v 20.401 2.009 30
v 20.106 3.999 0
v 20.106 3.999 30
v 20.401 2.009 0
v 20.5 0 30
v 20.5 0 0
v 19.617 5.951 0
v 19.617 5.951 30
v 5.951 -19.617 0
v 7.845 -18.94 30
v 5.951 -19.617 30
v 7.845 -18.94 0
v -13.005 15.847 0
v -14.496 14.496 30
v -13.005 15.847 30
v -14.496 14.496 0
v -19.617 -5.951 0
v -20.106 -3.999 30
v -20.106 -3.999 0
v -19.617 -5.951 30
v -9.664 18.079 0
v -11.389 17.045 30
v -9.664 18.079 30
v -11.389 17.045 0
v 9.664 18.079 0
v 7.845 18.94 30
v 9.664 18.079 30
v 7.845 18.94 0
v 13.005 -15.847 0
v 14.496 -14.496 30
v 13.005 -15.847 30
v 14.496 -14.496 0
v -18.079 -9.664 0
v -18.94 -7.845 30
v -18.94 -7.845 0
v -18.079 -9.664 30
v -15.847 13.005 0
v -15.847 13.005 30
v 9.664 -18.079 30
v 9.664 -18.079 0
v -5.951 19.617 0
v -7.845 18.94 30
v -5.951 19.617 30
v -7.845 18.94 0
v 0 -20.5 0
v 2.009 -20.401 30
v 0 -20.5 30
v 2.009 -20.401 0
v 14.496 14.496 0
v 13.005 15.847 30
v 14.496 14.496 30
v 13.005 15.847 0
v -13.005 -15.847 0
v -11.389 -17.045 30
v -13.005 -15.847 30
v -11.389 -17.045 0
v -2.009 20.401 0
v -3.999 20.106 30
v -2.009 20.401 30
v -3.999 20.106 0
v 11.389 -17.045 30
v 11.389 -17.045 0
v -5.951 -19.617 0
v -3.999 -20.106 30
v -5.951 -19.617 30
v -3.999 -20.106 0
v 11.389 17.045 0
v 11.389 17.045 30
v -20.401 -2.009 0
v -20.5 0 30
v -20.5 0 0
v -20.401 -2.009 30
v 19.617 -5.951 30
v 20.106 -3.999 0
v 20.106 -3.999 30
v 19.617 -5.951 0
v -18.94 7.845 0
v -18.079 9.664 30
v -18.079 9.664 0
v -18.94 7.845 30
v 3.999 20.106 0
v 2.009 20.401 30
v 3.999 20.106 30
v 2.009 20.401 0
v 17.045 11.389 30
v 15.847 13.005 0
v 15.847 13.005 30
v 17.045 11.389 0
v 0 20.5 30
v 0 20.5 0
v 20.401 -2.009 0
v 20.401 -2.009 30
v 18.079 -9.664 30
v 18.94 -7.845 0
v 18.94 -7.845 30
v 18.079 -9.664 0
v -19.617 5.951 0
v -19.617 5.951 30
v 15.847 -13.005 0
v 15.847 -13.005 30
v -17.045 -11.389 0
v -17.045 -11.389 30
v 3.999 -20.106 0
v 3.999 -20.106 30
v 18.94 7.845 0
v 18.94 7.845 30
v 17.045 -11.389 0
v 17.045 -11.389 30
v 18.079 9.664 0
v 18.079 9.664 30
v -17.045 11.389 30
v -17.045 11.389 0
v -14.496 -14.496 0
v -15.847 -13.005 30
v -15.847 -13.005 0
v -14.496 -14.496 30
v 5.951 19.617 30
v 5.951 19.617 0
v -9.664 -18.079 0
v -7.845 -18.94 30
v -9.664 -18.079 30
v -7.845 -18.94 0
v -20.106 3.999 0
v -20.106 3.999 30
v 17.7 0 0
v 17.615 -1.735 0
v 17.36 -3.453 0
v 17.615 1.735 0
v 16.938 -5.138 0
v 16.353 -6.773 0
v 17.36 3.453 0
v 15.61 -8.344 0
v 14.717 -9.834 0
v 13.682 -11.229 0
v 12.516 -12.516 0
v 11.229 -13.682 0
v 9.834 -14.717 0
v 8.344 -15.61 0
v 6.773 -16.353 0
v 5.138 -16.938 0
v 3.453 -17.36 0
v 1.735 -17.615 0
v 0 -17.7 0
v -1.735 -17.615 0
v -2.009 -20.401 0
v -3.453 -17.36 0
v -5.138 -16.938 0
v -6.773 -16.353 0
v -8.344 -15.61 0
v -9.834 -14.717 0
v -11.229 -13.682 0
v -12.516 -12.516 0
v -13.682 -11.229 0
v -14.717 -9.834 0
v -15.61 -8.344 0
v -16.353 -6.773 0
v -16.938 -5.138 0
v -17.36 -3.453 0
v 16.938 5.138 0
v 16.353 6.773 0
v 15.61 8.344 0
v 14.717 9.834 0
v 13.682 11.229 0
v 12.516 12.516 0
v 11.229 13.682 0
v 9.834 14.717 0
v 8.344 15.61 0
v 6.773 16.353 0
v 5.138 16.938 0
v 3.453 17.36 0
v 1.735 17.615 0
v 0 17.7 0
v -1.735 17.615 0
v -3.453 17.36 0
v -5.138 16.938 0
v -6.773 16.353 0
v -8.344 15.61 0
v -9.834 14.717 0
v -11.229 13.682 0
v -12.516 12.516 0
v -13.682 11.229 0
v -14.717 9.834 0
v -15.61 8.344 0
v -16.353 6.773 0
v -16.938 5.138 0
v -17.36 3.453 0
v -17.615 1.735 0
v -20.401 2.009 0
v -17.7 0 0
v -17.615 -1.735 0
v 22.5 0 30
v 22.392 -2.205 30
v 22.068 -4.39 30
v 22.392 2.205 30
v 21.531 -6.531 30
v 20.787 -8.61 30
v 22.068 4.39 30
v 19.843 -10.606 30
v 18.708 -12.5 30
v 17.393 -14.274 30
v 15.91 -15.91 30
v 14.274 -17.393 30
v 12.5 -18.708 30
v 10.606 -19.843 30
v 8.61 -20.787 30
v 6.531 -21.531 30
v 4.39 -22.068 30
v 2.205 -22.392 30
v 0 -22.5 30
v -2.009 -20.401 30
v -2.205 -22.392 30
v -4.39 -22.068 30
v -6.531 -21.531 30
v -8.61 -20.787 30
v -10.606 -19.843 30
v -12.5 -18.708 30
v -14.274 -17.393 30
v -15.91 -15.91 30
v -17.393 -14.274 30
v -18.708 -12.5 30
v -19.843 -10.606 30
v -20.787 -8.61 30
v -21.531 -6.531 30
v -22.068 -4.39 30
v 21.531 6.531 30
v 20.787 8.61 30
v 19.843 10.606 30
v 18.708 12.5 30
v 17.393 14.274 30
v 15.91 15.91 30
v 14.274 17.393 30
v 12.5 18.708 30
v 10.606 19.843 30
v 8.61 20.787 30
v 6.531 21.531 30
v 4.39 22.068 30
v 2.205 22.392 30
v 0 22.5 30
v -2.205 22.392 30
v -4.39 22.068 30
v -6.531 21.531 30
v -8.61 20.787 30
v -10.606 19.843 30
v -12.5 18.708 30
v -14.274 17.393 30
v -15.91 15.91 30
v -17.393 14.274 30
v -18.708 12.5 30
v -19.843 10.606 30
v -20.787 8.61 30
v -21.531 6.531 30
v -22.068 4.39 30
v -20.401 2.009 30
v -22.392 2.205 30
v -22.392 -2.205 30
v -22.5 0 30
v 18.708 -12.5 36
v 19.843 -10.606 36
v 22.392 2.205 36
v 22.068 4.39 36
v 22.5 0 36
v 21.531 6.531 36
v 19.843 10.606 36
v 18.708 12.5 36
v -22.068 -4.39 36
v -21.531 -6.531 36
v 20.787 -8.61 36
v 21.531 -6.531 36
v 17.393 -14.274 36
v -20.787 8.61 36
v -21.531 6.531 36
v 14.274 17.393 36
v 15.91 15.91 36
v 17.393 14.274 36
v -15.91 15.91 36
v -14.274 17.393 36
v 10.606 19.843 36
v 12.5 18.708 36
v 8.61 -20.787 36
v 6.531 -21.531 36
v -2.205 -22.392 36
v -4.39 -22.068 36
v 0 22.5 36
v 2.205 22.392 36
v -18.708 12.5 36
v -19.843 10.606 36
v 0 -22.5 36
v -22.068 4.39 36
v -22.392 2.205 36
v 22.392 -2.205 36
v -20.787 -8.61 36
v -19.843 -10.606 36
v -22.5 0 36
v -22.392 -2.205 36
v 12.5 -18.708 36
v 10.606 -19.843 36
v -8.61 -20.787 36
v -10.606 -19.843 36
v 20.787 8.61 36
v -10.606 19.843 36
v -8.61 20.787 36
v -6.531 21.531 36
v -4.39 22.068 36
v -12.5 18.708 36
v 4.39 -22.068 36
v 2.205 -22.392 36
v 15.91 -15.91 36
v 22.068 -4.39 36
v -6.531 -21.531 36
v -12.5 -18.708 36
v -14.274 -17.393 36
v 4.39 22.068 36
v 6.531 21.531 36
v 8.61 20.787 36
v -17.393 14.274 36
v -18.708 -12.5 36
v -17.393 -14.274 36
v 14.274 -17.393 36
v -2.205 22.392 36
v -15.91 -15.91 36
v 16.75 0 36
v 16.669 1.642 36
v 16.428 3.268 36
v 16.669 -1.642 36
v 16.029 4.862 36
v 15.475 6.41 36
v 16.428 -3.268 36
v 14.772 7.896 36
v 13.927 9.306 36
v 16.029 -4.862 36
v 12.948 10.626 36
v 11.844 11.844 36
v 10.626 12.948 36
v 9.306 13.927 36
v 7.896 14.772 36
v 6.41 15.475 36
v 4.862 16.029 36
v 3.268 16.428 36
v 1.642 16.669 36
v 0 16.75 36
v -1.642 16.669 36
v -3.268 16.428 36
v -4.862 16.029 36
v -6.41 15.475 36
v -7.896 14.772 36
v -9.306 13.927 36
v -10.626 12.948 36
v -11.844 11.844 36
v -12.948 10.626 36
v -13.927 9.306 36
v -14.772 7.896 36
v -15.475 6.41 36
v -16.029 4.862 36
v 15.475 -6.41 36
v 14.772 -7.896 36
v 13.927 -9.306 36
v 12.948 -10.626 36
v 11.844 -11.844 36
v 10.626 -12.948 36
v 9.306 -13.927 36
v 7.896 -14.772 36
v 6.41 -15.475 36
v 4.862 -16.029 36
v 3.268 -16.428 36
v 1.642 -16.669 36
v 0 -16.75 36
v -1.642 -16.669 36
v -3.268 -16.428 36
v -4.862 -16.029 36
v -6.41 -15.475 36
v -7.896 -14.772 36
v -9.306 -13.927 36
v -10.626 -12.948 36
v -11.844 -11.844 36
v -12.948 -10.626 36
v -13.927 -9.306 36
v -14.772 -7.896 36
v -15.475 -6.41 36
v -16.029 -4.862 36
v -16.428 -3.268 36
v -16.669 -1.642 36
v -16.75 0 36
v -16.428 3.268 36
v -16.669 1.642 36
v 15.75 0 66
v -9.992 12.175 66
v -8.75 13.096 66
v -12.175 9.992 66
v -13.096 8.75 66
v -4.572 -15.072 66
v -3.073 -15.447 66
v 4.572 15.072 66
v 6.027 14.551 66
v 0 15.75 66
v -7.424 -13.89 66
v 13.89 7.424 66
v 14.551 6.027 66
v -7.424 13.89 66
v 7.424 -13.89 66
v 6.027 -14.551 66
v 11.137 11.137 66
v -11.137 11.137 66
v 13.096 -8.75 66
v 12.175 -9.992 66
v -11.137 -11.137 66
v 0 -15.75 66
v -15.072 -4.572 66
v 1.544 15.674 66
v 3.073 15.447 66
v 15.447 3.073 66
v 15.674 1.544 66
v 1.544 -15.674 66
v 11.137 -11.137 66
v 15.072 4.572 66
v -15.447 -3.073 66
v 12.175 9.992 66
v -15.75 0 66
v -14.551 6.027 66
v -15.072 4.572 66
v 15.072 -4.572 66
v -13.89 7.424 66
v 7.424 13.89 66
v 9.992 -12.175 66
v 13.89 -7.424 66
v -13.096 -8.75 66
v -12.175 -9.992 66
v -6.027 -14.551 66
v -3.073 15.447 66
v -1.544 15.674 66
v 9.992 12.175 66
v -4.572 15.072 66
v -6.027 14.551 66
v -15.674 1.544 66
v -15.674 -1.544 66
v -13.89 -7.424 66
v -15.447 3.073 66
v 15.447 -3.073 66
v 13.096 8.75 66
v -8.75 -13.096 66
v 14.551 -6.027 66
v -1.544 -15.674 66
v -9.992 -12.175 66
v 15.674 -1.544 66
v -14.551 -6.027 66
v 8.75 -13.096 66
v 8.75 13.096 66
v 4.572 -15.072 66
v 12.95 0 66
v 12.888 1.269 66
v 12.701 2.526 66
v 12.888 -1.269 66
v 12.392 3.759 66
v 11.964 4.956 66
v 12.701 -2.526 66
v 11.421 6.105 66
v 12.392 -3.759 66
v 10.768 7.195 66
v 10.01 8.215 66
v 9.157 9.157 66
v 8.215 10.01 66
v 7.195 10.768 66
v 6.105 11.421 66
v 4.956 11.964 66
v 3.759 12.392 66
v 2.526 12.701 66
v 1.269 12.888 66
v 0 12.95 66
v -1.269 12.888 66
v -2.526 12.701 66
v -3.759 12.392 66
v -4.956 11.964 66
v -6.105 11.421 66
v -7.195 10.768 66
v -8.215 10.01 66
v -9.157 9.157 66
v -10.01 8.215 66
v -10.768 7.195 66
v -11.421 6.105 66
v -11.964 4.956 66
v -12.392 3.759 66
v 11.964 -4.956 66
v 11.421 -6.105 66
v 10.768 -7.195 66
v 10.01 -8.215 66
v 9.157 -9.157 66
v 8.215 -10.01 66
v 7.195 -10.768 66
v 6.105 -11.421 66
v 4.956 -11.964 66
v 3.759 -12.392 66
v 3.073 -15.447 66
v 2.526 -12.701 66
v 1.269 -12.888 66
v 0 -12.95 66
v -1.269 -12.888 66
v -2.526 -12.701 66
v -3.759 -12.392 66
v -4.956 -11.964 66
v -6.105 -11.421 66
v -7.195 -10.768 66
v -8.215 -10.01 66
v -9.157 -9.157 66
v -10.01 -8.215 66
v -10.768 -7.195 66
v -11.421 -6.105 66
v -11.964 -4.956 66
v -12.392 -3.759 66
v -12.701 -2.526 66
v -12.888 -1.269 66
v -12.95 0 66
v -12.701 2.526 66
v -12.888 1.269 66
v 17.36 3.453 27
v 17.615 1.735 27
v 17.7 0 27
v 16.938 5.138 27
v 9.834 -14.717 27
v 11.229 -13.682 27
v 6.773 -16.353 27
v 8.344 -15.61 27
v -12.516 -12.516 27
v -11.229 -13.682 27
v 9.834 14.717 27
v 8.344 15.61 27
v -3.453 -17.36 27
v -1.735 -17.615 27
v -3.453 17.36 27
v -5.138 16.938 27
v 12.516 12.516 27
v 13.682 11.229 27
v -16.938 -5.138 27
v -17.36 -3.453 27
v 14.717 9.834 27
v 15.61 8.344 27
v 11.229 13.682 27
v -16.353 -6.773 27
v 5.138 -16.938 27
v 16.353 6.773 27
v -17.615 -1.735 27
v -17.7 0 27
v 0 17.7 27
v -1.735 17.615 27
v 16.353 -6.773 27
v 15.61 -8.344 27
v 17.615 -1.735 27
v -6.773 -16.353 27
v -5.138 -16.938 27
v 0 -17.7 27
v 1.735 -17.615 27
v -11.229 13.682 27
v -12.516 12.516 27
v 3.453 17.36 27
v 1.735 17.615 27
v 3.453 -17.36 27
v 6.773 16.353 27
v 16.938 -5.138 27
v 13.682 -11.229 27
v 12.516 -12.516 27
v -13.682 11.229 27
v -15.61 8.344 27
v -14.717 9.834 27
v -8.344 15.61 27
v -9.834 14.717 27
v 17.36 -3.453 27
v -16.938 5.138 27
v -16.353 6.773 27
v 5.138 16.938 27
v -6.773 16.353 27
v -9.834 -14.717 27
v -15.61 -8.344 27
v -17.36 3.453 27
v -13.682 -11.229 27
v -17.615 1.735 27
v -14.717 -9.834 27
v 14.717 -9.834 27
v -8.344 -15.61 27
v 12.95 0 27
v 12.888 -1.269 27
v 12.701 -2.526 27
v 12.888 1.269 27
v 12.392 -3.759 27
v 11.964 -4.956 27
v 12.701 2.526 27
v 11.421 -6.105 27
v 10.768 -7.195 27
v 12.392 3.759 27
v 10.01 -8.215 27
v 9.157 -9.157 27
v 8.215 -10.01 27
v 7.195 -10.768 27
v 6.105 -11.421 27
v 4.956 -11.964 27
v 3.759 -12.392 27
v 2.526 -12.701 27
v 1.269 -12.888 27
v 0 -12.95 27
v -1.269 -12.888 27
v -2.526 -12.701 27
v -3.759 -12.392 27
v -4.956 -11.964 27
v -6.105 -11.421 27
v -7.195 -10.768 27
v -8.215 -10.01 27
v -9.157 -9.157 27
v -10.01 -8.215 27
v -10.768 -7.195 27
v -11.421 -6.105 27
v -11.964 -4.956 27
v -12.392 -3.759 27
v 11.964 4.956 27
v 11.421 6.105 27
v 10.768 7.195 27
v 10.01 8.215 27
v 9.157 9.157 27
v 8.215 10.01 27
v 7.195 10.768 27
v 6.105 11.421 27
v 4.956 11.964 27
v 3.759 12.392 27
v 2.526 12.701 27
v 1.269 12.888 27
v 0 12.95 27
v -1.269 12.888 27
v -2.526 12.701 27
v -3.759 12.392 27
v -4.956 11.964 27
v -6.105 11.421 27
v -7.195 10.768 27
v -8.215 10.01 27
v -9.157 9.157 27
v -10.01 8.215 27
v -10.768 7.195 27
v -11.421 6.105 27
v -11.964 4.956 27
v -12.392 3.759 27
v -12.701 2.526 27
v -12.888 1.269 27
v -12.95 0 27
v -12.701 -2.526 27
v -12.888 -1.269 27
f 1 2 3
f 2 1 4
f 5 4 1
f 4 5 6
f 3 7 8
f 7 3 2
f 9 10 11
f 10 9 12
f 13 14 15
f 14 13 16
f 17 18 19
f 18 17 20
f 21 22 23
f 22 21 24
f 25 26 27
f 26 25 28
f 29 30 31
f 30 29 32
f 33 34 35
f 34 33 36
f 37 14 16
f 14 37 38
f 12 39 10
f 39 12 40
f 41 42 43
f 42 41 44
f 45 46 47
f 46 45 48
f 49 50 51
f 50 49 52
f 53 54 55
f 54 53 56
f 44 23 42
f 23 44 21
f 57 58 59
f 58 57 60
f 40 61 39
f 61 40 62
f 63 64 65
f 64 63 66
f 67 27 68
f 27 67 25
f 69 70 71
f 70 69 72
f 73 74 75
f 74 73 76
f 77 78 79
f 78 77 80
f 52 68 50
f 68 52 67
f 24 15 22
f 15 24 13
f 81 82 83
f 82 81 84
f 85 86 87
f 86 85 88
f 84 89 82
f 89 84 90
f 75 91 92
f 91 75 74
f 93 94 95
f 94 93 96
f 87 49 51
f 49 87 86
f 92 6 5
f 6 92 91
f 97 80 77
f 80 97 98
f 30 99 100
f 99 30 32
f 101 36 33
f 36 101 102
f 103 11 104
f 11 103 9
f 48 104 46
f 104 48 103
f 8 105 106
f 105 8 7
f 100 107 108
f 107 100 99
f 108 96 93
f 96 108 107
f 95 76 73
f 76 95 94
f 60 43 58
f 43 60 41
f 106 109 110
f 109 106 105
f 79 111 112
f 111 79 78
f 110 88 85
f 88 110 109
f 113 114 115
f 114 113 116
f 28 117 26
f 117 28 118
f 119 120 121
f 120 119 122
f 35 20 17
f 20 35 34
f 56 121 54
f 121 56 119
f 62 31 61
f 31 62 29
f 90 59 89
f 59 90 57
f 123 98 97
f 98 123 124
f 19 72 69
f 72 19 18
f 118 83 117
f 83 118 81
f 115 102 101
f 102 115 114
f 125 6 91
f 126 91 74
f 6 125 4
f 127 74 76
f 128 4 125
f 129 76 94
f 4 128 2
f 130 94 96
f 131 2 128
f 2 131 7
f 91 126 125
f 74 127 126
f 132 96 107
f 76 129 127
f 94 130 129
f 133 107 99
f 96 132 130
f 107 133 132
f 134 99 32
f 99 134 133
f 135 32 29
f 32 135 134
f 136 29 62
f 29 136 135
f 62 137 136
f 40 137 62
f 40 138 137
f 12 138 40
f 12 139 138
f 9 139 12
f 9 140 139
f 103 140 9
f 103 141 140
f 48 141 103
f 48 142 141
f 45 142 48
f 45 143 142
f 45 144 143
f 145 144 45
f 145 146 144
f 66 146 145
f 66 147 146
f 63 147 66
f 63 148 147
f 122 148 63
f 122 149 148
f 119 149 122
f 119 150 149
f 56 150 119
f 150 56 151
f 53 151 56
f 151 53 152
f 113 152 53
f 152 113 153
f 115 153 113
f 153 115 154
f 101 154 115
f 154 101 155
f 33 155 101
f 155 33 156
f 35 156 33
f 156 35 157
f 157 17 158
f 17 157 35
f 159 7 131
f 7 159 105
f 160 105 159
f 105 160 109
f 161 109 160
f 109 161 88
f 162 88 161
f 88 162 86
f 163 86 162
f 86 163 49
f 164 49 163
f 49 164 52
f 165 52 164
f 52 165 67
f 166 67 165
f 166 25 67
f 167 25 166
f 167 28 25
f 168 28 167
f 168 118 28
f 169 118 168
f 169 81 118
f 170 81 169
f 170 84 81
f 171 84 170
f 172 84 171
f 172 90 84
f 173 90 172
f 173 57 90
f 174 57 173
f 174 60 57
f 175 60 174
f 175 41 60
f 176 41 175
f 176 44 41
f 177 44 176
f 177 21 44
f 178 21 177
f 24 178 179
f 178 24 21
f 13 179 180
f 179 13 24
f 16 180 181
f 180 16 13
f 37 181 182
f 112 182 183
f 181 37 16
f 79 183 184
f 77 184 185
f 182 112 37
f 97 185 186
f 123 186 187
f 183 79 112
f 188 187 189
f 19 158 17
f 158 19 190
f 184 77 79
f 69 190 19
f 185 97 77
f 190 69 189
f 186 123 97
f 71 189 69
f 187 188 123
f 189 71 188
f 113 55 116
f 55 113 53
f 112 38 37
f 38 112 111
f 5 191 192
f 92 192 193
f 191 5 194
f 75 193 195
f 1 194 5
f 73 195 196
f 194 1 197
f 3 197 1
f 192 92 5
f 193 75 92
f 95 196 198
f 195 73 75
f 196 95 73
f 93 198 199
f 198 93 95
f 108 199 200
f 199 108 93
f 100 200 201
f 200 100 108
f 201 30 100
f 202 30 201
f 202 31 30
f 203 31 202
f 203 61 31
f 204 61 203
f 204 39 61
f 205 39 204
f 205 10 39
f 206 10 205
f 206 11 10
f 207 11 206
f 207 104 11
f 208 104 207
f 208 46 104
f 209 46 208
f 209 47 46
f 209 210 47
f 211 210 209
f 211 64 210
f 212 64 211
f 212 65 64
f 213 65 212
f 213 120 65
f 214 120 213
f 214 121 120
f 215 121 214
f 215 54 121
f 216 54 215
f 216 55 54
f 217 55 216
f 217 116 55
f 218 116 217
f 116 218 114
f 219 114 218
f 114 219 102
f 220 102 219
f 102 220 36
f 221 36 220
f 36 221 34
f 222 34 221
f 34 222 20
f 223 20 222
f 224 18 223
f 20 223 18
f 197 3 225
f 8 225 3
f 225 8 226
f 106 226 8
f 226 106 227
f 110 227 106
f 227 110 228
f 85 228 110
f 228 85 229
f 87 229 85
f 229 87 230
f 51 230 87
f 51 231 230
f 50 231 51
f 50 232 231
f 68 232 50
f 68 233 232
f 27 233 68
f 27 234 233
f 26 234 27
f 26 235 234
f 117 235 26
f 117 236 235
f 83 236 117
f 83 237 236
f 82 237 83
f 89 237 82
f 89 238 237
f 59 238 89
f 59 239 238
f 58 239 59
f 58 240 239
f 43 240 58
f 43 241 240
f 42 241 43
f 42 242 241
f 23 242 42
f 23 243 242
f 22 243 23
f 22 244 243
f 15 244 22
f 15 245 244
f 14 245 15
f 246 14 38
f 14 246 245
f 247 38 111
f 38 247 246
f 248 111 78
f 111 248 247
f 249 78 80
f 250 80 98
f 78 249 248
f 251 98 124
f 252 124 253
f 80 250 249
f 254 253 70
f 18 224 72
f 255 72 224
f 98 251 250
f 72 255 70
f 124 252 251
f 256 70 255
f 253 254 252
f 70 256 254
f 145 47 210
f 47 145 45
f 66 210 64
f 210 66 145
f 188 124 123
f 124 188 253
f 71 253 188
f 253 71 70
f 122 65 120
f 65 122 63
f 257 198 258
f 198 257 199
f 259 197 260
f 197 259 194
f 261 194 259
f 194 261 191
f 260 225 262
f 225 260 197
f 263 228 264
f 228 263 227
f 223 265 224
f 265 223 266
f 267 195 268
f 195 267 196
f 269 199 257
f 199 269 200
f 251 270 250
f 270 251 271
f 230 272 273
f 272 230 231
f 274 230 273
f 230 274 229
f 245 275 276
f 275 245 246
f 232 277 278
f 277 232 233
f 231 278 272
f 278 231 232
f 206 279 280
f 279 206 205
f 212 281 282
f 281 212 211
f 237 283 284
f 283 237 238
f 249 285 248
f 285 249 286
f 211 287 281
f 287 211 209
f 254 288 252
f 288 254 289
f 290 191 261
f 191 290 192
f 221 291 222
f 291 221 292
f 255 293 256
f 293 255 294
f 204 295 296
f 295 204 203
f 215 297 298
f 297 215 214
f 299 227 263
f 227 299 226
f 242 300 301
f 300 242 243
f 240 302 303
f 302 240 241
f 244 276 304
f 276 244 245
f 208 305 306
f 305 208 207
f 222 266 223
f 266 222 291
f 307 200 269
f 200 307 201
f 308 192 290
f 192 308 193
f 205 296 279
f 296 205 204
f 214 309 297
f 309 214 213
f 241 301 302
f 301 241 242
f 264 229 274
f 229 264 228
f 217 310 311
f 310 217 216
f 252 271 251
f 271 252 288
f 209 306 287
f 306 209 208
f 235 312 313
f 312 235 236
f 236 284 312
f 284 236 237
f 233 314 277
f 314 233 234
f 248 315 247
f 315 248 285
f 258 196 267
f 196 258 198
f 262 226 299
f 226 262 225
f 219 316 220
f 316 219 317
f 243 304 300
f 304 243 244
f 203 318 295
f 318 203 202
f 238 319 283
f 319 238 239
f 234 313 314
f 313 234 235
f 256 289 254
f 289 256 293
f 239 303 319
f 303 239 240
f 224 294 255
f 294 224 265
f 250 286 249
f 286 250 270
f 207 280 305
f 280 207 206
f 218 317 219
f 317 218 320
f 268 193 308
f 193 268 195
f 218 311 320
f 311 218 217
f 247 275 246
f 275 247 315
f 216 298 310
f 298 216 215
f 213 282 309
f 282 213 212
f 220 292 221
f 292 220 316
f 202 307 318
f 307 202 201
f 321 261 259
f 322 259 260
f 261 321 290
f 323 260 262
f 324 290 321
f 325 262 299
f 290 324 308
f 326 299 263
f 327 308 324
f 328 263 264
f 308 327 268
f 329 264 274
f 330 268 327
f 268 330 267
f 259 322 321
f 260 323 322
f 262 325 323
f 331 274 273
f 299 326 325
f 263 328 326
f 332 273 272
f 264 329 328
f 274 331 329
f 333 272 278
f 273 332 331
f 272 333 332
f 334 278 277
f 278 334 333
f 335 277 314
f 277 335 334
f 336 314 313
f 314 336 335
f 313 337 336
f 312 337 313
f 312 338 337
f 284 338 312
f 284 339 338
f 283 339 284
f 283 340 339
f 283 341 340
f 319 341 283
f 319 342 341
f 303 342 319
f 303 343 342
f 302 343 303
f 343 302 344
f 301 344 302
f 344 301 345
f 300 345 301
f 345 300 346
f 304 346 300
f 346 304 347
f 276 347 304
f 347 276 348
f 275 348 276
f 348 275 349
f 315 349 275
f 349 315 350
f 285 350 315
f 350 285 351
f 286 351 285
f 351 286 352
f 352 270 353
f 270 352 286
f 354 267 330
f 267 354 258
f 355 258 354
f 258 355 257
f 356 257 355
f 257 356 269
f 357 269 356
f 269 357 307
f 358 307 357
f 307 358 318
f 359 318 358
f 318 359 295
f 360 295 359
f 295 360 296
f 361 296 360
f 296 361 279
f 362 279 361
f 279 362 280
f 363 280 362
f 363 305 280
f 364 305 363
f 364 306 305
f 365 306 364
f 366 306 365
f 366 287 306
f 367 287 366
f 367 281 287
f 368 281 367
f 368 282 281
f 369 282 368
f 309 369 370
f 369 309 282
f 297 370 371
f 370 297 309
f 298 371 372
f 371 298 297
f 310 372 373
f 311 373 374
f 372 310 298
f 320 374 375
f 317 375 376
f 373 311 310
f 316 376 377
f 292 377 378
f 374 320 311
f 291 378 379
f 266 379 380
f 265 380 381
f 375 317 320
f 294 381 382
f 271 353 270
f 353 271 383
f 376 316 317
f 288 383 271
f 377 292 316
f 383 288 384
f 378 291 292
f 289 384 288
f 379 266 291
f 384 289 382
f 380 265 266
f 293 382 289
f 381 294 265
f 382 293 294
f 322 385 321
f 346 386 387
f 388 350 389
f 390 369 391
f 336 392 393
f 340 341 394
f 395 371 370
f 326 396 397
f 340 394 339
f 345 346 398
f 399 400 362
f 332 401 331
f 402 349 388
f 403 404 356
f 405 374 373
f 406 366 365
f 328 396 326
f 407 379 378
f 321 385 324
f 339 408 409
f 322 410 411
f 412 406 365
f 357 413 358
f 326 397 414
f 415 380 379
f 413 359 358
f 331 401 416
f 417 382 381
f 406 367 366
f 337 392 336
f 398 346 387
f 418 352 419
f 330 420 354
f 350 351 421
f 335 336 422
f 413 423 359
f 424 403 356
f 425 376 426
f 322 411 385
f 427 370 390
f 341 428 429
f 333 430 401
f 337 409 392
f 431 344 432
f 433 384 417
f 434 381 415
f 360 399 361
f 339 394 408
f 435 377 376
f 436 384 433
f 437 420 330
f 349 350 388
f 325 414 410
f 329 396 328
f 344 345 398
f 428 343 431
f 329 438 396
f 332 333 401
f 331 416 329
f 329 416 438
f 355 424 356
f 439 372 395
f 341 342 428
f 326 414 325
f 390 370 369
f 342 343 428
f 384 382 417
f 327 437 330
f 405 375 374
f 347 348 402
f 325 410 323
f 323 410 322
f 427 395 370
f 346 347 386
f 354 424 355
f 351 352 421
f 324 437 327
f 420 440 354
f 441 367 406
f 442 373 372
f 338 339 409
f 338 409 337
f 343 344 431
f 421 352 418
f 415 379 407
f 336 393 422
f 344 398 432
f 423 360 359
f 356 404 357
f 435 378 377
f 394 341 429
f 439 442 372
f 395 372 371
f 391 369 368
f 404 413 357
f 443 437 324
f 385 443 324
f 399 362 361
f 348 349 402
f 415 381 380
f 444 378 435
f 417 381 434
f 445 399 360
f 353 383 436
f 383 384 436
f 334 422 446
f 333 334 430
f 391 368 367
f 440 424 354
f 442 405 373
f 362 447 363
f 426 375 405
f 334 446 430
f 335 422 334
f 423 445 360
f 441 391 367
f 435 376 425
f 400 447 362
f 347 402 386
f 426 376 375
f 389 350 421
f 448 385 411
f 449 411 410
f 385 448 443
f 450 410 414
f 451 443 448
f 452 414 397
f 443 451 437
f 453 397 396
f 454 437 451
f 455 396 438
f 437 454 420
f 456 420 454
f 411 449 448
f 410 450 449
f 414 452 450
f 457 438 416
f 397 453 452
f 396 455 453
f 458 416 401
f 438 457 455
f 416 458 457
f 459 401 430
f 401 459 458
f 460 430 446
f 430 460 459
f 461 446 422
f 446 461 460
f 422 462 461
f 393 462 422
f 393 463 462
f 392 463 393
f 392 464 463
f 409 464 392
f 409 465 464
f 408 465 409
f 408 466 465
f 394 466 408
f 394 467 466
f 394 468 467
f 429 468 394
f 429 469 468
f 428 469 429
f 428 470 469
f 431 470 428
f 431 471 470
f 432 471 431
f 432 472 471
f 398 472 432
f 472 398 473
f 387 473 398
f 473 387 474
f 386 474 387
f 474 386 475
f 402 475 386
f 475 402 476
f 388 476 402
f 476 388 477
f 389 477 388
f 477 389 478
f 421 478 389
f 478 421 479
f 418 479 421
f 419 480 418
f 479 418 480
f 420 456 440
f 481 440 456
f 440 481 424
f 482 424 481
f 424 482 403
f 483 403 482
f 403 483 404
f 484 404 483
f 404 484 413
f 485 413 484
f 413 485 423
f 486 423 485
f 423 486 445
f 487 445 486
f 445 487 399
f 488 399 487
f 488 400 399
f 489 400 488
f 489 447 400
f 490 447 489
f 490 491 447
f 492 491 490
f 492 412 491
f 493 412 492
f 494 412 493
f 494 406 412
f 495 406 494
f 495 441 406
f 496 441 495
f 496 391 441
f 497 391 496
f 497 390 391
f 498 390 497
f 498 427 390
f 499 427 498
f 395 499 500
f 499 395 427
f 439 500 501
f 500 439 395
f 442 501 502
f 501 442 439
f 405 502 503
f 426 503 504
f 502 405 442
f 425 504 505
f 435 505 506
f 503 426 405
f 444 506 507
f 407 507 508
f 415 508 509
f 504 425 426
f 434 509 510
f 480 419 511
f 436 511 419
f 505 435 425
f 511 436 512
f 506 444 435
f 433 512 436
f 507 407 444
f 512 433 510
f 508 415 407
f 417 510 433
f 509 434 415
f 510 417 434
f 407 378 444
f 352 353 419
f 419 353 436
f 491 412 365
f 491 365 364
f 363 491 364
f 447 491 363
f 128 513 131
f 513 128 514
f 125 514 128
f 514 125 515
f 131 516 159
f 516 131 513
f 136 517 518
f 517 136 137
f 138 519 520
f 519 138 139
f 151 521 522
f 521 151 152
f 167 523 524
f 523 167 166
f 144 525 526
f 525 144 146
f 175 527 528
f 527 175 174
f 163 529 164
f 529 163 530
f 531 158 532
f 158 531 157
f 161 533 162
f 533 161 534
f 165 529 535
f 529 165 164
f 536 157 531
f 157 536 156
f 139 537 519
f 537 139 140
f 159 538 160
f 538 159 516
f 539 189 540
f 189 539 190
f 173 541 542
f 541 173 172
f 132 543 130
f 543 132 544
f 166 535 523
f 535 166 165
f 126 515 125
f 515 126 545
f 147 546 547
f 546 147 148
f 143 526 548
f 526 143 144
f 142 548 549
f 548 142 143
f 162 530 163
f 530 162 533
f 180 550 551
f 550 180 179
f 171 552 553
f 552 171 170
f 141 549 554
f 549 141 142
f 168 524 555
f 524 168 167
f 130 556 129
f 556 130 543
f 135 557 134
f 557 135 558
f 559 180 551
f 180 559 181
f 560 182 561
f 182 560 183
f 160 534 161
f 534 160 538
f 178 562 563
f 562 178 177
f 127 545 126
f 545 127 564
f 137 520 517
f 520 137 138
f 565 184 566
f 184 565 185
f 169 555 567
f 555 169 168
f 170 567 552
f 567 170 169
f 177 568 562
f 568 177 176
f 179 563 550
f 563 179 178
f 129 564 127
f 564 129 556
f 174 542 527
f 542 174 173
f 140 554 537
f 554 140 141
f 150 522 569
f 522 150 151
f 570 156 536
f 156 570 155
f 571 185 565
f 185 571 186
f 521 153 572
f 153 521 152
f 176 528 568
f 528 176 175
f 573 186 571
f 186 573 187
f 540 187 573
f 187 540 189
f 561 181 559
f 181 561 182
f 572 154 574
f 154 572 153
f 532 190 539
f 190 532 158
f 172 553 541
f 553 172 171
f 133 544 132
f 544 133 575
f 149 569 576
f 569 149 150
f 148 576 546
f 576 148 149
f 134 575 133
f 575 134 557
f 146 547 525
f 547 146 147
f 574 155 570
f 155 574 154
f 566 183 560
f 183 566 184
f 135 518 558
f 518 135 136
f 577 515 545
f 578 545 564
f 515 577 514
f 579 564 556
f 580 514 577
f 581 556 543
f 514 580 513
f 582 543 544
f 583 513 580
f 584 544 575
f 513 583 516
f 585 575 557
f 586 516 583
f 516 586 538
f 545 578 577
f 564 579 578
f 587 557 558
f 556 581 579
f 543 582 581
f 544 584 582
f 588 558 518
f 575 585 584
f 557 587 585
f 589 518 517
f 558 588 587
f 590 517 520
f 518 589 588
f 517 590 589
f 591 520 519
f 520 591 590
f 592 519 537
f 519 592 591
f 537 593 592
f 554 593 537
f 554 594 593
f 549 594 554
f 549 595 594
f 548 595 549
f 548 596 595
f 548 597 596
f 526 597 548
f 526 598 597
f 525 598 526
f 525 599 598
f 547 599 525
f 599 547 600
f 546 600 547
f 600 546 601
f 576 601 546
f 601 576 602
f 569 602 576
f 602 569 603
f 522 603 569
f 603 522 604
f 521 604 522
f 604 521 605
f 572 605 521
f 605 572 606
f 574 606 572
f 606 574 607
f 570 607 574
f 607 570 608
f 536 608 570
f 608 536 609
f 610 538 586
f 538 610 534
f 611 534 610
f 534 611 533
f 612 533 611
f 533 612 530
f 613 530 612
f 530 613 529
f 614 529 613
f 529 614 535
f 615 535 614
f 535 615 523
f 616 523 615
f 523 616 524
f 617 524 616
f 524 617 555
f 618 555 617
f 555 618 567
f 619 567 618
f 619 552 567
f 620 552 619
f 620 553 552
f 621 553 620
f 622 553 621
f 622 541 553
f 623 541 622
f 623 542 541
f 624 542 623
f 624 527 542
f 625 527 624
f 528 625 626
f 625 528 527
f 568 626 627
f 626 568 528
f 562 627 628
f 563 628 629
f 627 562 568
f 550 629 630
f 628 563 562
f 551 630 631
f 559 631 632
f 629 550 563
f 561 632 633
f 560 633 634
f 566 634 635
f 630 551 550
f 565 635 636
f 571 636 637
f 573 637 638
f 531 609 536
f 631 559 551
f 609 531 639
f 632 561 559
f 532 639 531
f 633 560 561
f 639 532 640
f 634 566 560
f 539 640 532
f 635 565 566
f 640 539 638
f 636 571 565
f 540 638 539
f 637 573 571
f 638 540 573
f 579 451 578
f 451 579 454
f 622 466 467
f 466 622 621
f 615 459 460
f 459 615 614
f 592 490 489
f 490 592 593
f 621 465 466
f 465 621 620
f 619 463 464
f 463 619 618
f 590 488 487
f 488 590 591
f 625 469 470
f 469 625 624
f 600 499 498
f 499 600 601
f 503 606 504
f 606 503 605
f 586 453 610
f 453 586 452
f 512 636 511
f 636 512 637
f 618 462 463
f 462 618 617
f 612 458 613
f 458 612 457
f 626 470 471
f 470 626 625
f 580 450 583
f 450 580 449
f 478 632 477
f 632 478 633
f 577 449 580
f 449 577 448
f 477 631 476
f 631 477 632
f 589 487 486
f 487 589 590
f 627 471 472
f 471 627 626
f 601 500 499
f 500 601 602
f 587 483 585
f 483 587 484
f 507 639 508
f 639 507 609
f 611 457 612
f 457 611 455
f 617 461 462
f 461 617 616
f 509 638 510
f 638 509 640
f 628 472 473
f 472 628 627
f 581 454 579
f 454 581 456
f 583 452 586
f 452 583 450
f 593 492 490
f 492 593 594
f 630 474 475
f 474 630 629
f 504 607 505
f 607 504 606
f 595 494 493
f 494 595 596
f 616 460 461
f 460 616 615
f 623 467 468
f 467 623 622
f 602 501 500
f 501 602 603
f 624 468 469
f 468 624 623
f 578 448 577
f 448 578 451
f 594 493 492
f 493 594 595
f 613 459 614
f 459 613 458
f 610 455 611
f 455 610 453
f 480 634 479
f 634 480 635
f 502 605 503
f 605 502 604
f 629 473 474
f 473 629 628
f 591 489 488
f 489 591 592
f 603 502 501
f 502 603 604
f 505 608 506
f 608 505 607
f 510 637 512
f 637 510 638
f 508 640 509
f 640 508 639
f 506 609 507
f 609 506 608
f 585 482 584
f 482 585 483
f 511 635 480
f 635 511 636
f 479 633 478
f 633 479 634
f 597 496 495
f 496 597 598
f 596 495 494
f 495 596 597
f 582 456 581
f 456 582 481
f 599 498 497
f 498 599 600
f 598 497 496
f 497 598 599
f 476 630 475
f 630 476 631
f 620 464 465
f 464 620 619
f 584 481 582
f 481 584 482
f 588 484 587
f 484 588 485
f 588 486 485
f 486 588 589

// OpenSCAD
// file: common.scad
// KARAKURI shared parameters and helpers
// All dimensions in millimetres. Holes are printed undersize-safe:
// M3 through 3.4, M4 through 4.5, M2.5 through 2.9, quarter-inch 6.6.

$fn = 64;

m2_5 = 2.9;
m3 = 3.4;
m4 = 4.5;
quarter_inch = 6.6;

module rounded_plate(x, y, t, r = 8) {
    linear_extrude(t)
        offset(r = r) offset(delta = -r)
            square([x, y], center = true);
}

module hole(d, h) {
    translate([0, 0, -0.5]) cylinder(d = d, h = h + 1);
}

module slot(d, len, h) {
    translate([0, 0, -0.5])
        linear_extrude(h + 1)
            hull() {
                translate([-len / 2, 0]) circle(d = d);
                translate([ len / 2, 0]) circle(d = d);
            }
}

module four_holes(dx, dy, d, h) {
    for (sx = [-1, 1], sy = [-1, 1])
        translate([sx * dx / 2, sy * dy / 2, 0]) hole(d, h);
}
// main file
// Tapered hose coupler between the nozzle port and the donor vacuum
// hose. Defaults join the 35 mm nozzle port to a 32 mm hose cuff,
// which suits the Bissell Featherweight and most Walmart stick vac
// hoses. Measure your donor's hose inner diameter and set hose_id
// before printing. A wrap of electrical tape fine tunes the fit.

include <common.scad>

port_od = 35.0;     // the nozzle port outer diameter this sleeves over
socket_id = 35.4;   // slip fit over the port
hose_id = 31.5;     // slides inside the donor hose cuff
wall_t = 2.8;
seg_len = 30;

module hose_coupler() {
    difference() {
        union() {
            cylinder(d = socket_id + 2 * wall_t, h = seg_len);          // socket sleeve
            translate([0, 0, seg_len]) cylinder(d = socket_id + 2 * wall_t + 4, h = 6);
            translate([0, 0, seg_len + 6])
                cylinder(d1 = hose_id + 2, d2 = hose_id, h = seg_len);  // hose taper
        }
        // socket pocket that swallows the port
        translate([0, 0, -0.5]) cylinder(d = socket_id, h = seg_len - 3 + 0.5);
        // continuous air bore matching the port inner diameter
        translate([0, 0, -0.5]) cylinder(d = hose_id - 2 * wall_t, h = 2 * seg_len + 8);
    }
}

hose_coupler();
